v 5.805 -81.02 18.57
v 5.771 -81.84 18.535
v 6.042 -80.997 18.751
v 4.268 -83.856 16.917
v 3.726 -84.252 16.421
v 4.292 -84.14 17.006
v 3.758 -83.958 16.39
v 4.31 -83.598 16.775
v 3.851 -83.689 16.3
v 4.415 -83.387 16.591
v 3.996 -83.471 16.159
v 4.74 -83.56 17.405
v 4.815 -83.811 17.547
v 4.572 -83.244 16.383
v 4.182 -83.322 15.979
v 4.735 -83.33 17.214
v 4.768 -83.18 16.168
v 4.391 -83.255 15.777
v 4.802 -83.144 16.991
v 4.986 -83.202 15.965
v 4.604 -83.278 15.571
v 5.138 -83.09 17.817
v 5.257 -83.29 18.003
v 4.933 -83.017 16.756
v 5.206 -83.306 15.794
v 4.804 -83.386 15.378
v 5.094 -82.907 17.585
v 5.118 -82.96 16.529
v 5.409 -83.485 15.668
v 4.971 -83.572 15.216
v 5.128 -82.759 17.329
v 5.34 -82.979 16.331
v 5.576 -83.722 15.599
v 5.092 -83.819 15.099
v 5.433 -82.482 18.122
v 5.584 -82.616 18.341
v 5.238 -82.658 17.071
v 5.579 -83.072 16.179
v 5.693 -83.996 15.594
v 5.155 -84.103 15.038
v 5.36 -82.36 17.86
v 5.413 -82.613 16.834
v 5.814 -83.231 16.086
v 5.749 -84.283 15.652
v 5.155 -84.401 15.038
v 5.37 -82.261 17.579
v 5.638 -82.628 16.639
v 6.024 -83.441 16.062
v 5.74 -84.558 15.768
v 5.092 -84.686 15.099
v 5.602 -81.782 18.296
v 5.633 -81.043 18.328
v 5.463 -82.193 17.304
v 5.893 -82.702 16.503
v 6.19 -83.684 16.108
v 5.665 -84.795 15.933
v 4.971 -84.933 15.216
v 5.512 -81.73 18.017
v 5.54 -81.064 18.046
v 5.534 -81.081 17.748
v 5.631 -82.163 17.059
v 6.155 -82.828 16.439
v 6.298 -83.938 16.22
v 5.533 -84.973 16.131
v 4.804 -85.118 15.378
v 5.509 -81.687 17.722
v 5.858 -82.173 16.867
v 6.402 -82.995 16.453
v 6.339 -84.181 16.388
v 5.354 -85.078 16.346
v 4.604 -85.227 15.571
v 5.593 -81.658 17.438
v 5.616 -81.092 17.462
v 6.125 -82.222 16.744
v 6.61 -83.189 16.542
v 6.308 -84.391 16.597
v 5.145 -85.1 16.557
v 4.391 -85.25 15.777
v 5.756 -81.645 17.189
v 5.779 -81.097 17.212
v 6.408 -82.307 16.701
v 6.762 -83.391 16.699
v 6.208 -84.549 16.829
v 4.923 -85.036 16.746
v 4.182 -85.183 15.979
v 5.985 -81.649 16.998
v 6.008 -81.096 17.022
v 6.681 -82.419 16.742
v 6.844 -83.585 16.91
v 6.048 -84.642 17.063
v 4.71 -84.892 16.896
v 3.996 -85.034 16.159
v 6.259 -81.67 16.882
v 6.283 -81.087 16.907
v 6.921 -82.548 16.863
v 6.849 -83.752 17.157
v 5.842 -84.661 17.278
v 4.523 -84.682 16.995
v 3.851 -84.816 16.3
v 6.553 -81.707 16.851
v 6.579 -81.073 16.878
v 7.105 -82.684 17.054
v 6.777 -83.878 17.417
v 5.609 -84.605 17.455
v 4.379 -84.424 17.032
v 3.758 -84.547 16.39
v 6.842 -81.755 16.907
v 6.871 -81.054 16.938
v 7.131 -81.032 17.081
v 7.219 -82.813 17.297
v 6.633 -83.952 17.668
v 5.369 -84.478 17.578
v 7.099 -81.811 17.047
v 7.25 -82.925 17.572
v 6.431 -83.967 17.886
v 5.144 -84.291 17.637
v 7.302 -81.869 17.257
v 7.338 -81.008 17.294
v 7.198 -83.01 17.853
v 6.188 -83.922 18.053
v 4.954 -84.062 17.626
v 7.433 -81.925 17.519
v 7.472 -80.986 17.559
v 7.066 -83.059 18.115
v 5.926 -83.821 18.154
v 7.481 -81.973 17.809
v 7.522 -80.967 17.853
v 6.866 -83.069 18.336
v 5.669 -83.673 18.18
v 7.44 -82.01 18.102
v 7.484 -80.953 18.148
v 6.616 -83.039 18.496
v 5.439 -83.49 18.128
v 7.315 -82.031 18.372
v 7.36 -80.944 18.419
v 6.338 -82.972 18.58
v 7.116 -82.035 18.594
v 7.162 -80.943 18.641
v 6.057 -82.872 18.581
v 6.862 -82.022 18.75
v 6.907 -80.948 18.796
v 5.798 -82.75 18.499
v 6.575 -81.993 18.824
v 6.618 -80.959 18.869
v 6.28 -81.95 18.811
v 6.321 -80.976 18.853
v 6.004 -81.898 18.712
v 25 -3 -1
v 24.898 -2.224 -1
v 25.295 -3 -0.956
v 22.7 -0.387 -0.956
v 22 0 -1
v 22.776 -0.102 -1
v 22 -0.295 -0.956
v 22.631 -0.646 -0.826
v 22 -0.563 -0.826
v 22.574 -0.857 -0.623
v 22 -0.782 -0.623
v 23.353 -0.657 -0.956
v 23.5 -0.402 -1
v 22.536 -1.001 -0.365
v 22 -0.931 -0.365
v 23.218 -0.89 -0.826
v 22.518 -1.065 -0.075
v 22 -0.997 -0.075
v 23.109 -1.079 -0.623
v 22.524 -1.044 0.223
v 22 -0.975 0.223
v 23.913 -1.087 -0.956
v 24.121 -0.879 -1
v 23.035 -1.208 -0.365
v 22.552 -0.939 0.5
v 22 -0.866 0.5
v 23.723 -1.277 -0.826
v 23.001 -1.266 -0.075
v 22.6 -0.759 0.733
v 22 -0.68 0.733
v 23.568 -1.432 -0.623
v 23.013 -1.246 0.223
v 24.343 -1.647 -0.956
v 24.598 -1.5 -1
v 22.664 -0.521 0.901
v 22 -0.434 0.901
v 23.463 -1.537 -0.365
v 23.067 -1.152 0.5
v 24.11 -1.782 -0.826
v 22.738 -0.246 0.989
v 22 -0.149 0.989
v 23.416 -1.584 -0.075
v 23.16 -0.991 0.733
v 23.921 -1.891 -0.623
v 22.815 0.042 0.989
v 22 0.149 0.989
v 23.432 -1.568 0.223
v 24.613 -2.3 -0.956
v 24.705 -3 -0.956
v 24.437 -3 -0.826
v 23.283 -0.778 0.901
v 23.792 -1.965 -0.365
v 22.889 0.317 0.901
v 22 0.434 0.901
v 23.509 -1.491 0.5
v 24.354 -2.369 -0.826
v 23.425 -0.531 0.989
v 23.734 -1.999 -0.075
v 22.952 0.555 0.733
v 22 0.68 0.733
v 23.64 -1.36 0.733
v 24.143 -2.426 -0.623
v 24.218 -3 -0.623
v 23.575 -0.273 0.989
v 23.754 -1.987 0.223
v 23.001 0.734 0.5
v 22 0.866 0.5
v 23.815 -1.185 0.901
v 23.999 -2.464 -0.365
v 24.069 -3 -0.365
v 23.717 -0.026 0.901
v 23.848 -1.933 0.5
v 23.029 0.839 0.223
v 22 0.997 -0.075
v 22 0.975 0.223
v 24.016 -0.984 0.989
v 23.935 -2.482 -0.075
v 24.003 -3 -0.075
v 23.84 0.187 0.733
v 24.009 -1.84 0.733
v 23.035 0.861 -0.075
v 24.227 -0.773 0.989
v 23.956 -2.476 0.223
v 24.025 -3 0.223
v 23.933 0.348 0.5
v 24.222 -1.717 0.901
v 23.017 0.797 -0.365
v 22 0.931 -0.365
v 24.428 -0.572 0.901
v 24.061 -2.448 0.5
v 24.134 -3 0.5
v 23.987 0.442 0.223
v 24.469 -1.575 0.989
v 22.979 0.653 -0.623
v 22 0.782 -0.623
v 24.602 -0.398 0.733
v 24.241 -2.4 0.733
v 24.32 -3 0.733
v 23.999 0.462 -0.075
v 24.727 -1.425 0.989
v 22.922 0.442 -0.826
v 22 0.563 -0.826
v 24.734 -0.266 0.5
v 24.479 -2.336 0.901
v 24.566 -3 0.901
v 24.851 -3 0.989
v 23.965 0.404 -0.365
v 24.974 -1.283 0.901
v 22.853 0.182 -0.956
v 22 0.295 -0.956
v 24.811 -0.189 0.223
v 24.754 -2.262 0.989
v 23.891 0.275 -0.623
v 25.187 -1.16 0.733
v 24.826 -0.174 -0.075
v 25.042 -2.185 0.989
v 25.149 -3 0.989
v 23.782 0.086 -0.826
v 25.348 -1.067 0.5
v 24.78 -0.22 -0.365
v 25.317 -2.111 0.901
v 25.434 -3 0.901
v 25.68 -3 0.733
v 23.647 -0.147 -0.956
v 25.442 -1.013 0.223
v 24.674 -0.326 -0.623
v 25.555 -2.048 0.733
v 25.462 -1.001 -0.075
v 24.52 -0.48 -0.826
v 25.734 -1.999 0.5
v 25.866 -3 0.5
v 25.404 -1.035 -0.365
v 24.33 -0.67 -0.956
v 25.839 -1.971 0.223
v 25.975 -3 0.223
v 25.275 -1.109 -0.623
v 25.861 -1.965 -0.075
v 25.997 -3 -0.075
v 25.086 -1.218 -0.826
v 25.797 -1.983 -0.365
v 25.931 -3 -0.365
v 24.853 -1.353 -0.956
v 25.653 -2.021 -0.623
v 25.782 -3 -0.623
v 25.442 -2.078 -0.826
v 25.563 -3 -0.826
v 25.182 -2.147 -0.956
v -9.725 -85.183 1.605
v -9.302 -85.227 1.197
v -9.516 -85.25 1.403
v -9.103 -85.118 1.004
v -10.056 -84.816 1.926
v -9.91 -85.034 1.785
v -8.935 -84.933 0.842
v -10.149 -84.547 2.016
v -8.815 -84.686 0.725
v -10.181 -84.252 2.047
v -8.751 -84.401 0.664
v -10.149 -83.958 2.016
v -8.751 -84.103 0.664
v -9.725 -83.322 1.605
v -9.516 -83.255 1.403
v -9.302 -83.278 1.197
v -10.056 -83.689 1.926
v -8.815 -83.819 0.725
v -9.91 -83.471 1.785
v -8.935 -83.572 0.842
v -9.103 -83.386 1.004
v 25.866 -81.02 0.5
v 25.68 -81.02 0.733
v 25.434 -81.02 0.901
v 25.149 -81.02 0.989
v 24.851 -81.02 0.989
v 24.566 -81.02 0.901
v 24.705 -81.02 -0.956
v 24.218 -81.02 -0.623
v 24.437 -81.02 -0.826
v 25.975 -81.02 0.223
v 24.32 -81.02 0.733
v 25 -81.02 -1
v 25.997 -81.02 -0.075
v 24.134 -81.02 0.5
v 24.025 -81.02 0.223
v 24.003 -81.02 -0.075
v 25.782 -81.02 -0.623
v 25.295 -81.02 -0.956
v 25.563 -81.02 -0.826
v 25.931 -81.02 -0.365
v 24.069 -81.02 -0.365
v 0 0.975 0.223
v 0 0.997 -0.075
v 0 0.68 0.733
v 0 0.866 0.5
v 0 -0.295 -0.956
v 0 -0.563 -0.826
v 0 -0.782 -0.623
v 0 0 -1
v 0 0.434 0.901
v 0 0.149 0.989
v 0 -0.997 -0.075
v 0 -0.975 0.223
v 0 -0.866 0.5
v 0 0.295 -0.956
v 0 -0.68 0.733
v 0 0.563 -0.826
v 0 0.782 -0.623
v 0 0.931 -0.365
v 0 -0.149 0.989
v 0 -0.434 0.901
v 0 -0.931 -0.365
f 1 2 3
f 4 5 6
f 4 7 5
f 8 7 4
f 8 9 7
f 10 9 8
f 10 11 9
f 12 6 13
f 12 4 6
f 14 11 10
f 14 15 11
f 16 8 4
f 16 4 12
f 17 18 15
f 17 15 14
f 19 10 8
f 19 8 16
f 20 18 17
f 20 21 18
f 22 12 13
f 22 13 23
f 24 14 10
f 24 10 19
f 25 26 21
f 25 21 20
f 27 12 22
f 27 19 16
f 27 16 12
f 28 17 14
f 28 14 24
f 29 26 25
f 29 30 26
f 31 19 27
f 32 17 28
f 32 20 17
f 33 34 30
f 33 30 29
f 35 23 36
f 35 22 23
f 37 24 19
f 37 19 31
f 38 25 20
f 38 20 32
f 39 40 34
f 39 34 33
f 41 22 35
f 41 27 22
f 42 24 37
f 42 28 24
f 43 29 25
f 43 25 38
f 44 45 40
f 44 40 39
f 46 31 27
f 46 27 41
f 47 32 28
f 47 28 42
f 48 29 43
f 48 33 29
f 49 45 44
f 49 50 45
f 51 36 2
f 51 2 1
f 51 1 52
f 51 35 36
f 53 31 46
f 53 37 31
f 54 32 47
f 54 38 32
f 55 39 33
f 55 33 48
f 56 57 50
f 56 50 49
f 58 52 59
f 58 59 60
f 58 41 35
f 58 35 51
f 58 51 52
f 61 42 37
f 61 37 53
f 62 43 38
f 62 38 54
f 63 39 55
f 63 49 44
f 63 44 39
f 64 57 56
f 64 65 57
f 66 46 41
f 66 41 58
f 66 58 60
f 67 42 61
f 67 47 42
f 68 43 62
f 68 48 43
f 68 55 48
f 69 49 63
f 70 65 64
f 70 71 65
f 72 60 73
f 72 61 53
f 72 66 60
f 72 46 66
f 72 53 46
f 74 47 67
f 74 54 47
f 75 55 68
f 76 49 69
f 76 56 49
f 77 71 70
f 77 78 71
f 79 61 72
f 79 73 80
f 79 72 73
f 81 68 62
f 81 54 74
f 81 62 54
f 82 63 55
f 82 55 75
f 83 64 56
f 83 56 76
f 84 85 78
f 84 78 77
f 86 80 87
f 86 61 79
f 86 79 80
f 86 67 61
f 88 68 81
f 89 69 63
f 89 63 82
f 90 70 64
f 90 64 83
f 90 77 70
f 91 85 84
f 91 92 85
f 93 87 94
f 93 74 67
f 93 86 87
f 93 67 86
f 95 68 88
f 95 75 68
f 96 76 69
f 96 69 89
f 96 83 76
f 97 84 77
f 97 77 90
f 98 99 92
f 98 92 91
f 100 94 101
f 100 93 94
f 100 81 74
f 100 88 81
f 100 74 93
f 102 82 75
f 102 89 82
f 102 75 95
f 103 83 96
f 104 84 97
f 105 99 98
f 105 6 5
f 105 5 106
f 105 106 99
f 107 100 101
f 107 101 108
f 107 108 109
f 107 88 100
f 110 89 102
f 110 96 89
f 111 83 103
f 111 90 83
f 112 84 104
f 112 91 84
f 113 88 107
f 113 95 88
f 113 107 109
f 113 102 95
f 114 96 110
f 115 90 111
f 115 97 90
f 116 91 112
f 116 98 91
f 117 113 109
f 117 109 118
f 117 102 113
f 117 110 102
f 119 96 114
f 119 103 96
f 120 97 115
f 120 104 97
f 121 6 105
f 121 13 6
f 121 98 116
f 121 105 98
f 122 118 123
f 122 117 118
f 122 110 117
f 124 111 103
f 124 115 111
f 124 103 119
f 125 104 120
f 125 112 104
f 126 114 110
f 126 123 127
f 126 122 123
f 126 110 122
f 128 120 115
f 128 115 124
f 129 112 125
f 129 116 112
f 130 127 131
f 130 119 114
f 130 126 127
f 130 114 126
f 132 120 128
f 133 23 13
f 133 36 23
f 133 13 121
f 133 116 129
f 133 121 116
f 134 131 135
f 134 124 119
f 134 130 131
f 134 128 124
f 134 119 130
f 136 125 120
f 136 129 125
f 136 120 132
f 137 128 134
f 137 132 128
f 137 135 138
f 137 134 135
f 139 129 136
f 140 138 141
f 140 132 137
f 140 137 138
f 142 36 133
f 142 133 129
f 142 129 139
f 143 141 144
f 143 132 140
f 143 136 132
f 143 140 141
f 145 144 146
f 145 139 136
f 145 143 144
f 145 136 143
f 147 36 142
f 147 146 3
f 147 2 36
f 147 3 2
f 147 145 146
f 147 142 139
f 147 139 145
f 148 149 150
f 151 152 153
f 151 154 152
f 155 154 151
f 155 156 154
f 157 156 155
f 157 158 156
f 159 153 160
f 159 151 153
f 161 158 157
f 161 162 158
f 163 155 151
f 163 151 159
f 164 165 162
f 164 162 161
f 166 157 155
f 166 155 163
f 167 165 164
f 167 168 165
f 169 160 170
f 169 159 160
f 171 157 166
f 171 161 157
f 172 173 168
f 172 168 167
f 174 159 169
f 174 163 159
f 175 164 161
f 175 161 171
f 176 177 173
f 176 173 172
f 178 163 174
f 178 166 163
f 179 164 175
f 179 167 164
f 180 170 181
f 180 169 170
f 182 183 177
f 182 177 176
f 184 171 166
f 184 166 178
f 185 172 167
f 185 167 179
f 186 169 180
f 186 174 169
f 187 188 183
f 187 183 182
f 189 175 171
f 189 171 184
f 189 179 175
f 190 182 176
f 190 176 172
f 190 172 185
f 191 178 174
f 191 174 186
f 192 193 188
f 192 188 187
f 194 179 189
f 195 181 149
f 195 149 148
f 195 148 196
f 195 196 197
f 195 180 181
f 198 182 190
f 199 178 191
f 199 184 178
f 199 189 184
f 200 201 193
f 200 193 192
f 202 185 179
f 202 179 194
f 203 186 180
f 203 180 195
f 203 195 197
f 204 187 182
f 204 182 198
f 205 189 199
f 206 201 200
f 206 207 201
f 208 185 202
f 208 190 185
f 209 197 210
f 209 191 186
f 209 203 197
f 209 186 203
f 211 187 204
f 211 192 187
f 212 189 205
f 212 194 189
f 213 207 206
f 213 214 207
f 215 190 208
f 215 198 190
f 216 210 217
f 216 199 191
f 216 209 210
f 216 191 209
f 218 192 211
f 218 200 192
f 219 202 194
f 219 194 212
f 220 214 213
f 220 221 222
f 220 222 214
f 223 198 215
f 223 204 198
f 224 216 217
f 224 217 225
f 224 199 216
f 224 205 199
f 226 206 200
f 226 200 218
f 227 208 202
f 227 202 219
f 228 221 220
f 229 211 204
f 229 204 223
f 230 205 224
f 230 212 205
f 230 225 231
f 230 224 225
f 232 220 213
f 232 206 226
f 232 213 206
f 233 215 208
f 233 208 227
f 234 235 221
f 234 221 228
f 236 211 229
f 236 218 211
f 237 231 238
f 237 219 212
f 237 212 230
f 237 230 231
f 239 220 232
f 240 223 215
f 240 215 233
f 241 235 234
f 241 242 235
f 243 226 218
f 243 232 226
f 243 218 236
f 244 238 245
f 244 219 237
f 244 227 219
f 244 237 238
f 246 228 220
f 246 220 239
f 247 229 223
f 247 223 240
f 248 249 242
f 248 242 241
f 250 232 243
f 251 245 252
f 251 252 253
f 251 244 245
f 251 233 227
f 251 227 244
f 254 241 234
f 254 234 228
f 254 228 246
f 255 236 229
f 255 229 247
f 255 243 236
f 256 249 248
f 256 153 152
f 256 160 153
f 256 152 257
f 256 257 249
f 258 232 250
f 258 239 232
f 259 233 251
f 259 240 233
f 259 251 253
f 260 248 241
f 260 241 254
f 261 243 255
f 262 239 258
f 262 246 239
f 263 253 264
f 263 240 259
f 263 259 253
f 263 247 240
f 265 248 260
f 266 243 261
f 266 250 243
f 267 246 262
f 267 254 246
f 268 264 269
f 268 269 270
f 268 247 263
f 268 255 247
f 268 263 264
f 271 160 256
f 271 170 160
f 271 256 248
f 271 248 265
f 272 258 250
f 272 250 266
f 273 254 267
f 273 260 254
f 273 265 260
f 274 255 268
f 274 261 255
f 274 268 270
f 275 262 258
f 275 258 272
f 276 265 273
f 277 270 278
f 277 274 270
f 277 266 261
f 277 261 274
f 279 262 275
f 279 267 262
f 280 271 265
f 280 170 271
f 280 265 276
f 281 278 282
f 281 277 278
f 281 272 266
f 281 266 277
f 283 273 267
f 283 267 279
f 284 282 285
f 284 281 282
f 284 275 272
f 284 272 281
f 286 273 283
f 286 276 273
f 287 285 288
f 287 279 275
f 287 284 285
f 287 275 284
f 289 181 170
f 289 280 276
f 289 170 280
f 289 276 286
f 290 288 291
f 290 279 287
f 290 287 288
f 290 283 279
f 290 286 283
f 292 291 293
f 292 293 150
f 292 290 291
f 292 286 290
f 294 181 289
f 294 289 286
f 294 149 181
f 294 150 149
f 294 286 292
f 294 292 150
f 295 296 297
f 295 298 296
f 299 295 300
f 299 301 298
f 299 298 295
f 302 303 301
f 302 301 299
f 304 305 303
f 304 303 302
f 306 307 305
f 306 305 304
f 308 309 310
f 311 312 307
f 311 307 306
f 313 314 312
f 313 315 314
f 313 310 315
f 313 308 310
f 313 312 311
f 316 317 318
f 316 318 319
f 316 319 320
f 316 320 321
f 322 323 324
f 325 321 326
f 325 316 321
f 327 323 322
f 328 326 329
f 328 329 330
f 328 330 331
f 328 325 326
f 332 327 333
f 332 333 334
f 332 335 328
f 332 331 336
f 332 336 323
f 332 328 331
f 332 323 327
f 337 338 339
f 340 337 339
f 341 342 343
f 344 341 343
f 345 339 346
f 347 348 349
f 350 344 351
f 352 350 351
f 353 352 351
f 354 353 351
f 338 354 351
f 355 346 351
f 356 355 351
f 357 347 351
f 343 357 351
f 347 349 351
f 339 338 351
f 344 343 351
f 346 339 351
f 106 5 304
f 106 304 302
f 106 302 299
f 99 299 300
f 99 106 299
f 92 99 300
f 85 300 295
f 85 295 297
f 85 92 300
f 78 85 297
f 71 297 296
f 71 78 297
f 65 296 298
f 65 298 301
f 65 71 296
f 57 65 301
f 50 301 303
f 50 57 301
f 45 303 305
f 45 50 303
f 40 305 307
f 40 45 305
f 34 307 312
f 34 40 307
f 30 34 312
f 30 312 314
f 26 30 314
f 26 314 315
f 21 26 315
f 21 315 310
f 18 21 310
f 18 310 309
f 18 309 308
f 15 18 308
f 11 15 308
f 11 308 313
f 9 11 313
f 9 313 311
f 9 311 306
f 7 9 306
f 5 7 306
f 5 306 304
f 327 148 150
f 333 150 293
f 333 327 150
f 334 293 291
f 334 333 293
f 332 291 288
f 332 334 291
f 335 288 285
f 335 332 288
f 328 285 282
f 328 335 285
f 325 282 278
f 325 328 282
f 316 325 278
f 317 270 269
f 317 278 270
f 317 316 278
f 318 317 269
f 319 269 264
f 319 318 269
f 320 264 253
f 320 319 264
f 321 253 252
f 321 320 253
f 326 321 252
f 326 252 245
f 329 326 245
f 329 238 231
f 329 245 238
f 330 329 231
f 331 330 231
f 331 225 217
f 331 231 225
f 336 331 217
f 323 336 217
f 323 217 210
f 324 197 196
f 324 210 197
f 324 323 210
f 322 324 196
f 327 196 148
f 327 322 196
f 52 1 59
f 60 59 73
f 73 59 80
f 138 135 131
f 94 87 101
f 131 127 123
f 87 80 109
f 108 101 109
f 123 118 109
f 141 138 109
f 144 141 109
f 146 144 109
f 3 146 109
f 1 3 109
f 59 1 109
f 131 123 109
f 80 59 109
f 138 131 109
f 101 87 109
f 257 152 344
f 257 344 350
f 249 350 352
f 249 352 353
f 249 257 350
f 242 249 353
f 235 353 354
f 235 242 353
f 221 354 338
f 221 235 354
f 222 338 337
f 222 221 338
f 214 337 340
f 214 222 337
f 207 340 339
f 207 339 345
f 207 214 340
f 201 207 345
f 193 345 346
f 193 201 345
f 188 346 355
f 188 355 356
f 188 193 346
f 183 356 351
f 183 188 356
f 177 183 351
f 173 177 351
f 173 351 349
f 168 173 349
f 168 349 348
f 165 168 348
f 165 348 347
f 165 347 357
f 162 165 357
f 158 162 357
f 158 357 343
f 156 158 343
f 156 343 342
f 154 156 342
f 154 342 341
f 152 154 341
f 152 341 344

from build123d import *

# Parameters (mm, degrees)
SKETCH3_R = 1
SKETCH6_R = 1


with BuildPart() as part:
    # Sweep1: sweep along a path in Sketch1
    with BuildLine(Plane.XY) as sweep1_path:
        Line((0, 0), (22, 0))
        ThreePointArc((22, 0), (24.121320344, -0.878679656), (25, -3))
        Line((25, -3), (25, -81.02))
    # Sketch3 → Sweep1 (sweep)
    with BuildSketch(Plane(origin=(0, 0, 0), x_dir=(0, 0, -1), z_dir=(1, 0, 0))):
        Circle(SKETCH3_R)
    sweep(path=sweep1_path.line)


with BuildPart() as body_2:
    # Sweep3: sweep along a path in Sketch4
    with BuildLine(Plane(origin=(-5.562759222, 0, 5.381828123), x_dir=(-0.6953221964979748, 0, -0.718698158518047), z_dir=(0.718698158518047, 0, -0.6953221964979748))) as sweep3_path:
        Line((5.60792605, -84.252449737), (-14.39207395, -84.252449737))
        ThreePointArc((-14.39207395, -84.252449737), (-16.594044568, -83.289929895), (-17.383054912, -81.02))
    # Sketch6 → Sweep3 (sweep)
    with BuildSketch(Plane(origin=(-9.462074682, -84.252449737, 1.351421997), x_dir=(-0.718698158518047, 0, 0.6953221964979748), z_dir=(-0.6953221964979748, 1.3877787807814465e-15, -0.718698158518047))):
        Circle(SKETCH6_R)
    sweep(path=sweep3_path.line)


solid = Compound([part.part, body_2.part])
